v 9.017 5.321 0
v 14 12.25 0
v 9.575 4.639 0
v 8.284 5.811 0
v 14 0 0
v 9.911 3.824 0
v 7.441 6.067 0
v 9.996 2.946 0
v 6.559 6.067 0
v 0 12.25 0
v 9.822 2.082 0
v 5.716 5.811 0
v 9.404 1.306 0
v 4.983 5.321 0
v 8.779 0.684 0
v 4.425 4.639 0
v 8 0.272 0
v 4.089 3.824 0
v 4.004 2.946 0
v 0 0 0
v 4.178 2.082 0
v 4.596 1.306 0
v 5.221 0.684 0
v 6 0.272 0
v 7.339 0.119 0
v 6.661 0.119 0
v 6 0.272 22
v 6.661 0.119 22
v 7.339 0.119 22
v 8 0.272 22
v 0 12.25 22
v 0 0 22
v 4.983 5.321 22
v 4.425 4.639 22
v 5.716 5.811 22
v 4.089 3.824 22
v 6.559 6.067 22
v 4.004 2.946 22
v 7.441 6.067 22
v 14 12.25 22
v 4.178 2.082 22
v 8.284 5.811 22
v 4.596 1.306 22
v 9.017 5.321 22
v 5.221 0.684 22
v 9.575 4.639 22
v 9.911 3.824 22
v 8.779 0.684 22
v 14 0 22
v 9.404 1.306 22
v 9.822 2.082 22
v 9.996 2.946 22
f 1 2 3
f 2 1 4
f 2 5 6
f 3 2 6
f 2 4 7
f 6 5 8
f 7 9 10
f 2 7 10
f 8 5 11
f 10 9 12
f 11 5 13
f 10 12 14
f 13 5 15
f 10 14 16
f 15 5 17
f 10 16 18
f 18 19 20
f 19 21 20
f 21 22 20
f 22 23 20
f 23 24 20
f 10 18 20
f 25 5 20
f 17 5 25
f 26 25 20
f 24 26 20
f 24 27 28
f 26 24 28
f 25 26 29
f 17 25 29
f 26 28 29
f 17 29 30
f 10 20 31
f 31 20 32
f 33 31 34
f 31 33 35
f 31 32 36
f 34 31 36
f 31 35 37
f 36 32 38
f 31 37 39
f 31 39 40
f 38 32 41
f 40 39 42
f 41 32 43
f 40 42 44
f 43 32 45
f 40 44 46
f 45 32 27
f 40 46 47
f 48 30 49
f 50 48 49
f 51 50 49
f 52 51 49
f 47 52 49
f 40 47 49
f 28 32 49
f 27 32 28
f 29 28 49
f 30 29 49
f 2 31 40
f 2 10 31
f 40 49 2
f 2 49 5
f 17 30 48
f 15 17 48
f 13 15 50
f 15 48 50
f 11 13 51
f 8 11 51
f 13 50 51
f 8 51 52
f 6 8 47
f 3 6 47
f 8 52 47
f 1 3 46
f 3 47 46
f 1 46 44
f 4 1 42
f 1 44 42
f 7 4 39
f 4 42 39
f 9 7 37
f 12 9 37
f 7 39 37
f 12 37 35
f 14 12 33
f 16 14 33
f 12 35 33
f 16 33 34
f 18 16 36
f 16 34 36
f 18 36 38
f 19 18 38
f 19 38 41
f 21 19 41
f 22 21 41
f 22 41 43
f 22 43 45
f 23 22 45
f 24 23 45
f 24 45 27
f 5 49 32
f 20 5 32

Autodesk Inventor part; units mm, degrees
ref_plane "YZ Plane" through (0, 0, 0) normal (1, 0, 0) x (0, 1, 0)
ref_plane "XZ Plane" through (0, 0, 0) normal (0, 1, 0) x (-1, 0, 0)
ref_plane "XY Plane" through (0, 0, 0) normal (0, 0, 1) x (1, 0, 0)
sketch "Szkic1" plane through (0, 0, 0) normal (0, 1, 0) x (-1, 0, 0)
  line L0 (0, 0) -> (-14, 0)
  line L1 (-14, 0) -> (-14, 22)
  line L2 (-14, 22) -> (0, 22)
  line L3 (0, 22) -> (0, 0)
  dimension "d0" = 14
  dimension "d1" = 22
extrude "Wyciągnięcie proste1" add sketch "Szkic1" along normal blind 8.25
sketch "Szkic2" plane through (0, 0, 22) normal (0, 0, 1) x (1, 0, 0)
  circle A0 centre (7, 3.1) radius 1 projected
  arc A1 (8, 0.2716) -> (6, 0.2716) centre (7, 3.1) ccw projected
  line L0 (6, 0.2716) -> (6, 0) projected
  line L1 (6, 0) -> (8, 0) projected
  line L2 (8, 0) -> (8, 0.2716) projected
  circle A2 centre (7, 3.1) radius 3
  point P0 (0, 0)
  point P1 (6, 0.2716)
extrude "Wyciągnięcie proste2" cut sketch "Szkic2" against normal through all contours A0 | A2 A1
sketch "Szkic3" plane through (0, 8.25, 0) normal (0, 1, 0) x (1, 0, 0)
  line L0 (0, -22) -> (14, -22) projected
  line L1 (14, -22) -> (14, 0) projected
  line L2 (14, 0) -> (0, 0) projected
  line L3 (0, 0) -> (0, -22) projected
extrude "Wyciągnięcie proste3" add sketch "Szkic3" along normal blind 4
properties part number "uchwyt silnikow"
